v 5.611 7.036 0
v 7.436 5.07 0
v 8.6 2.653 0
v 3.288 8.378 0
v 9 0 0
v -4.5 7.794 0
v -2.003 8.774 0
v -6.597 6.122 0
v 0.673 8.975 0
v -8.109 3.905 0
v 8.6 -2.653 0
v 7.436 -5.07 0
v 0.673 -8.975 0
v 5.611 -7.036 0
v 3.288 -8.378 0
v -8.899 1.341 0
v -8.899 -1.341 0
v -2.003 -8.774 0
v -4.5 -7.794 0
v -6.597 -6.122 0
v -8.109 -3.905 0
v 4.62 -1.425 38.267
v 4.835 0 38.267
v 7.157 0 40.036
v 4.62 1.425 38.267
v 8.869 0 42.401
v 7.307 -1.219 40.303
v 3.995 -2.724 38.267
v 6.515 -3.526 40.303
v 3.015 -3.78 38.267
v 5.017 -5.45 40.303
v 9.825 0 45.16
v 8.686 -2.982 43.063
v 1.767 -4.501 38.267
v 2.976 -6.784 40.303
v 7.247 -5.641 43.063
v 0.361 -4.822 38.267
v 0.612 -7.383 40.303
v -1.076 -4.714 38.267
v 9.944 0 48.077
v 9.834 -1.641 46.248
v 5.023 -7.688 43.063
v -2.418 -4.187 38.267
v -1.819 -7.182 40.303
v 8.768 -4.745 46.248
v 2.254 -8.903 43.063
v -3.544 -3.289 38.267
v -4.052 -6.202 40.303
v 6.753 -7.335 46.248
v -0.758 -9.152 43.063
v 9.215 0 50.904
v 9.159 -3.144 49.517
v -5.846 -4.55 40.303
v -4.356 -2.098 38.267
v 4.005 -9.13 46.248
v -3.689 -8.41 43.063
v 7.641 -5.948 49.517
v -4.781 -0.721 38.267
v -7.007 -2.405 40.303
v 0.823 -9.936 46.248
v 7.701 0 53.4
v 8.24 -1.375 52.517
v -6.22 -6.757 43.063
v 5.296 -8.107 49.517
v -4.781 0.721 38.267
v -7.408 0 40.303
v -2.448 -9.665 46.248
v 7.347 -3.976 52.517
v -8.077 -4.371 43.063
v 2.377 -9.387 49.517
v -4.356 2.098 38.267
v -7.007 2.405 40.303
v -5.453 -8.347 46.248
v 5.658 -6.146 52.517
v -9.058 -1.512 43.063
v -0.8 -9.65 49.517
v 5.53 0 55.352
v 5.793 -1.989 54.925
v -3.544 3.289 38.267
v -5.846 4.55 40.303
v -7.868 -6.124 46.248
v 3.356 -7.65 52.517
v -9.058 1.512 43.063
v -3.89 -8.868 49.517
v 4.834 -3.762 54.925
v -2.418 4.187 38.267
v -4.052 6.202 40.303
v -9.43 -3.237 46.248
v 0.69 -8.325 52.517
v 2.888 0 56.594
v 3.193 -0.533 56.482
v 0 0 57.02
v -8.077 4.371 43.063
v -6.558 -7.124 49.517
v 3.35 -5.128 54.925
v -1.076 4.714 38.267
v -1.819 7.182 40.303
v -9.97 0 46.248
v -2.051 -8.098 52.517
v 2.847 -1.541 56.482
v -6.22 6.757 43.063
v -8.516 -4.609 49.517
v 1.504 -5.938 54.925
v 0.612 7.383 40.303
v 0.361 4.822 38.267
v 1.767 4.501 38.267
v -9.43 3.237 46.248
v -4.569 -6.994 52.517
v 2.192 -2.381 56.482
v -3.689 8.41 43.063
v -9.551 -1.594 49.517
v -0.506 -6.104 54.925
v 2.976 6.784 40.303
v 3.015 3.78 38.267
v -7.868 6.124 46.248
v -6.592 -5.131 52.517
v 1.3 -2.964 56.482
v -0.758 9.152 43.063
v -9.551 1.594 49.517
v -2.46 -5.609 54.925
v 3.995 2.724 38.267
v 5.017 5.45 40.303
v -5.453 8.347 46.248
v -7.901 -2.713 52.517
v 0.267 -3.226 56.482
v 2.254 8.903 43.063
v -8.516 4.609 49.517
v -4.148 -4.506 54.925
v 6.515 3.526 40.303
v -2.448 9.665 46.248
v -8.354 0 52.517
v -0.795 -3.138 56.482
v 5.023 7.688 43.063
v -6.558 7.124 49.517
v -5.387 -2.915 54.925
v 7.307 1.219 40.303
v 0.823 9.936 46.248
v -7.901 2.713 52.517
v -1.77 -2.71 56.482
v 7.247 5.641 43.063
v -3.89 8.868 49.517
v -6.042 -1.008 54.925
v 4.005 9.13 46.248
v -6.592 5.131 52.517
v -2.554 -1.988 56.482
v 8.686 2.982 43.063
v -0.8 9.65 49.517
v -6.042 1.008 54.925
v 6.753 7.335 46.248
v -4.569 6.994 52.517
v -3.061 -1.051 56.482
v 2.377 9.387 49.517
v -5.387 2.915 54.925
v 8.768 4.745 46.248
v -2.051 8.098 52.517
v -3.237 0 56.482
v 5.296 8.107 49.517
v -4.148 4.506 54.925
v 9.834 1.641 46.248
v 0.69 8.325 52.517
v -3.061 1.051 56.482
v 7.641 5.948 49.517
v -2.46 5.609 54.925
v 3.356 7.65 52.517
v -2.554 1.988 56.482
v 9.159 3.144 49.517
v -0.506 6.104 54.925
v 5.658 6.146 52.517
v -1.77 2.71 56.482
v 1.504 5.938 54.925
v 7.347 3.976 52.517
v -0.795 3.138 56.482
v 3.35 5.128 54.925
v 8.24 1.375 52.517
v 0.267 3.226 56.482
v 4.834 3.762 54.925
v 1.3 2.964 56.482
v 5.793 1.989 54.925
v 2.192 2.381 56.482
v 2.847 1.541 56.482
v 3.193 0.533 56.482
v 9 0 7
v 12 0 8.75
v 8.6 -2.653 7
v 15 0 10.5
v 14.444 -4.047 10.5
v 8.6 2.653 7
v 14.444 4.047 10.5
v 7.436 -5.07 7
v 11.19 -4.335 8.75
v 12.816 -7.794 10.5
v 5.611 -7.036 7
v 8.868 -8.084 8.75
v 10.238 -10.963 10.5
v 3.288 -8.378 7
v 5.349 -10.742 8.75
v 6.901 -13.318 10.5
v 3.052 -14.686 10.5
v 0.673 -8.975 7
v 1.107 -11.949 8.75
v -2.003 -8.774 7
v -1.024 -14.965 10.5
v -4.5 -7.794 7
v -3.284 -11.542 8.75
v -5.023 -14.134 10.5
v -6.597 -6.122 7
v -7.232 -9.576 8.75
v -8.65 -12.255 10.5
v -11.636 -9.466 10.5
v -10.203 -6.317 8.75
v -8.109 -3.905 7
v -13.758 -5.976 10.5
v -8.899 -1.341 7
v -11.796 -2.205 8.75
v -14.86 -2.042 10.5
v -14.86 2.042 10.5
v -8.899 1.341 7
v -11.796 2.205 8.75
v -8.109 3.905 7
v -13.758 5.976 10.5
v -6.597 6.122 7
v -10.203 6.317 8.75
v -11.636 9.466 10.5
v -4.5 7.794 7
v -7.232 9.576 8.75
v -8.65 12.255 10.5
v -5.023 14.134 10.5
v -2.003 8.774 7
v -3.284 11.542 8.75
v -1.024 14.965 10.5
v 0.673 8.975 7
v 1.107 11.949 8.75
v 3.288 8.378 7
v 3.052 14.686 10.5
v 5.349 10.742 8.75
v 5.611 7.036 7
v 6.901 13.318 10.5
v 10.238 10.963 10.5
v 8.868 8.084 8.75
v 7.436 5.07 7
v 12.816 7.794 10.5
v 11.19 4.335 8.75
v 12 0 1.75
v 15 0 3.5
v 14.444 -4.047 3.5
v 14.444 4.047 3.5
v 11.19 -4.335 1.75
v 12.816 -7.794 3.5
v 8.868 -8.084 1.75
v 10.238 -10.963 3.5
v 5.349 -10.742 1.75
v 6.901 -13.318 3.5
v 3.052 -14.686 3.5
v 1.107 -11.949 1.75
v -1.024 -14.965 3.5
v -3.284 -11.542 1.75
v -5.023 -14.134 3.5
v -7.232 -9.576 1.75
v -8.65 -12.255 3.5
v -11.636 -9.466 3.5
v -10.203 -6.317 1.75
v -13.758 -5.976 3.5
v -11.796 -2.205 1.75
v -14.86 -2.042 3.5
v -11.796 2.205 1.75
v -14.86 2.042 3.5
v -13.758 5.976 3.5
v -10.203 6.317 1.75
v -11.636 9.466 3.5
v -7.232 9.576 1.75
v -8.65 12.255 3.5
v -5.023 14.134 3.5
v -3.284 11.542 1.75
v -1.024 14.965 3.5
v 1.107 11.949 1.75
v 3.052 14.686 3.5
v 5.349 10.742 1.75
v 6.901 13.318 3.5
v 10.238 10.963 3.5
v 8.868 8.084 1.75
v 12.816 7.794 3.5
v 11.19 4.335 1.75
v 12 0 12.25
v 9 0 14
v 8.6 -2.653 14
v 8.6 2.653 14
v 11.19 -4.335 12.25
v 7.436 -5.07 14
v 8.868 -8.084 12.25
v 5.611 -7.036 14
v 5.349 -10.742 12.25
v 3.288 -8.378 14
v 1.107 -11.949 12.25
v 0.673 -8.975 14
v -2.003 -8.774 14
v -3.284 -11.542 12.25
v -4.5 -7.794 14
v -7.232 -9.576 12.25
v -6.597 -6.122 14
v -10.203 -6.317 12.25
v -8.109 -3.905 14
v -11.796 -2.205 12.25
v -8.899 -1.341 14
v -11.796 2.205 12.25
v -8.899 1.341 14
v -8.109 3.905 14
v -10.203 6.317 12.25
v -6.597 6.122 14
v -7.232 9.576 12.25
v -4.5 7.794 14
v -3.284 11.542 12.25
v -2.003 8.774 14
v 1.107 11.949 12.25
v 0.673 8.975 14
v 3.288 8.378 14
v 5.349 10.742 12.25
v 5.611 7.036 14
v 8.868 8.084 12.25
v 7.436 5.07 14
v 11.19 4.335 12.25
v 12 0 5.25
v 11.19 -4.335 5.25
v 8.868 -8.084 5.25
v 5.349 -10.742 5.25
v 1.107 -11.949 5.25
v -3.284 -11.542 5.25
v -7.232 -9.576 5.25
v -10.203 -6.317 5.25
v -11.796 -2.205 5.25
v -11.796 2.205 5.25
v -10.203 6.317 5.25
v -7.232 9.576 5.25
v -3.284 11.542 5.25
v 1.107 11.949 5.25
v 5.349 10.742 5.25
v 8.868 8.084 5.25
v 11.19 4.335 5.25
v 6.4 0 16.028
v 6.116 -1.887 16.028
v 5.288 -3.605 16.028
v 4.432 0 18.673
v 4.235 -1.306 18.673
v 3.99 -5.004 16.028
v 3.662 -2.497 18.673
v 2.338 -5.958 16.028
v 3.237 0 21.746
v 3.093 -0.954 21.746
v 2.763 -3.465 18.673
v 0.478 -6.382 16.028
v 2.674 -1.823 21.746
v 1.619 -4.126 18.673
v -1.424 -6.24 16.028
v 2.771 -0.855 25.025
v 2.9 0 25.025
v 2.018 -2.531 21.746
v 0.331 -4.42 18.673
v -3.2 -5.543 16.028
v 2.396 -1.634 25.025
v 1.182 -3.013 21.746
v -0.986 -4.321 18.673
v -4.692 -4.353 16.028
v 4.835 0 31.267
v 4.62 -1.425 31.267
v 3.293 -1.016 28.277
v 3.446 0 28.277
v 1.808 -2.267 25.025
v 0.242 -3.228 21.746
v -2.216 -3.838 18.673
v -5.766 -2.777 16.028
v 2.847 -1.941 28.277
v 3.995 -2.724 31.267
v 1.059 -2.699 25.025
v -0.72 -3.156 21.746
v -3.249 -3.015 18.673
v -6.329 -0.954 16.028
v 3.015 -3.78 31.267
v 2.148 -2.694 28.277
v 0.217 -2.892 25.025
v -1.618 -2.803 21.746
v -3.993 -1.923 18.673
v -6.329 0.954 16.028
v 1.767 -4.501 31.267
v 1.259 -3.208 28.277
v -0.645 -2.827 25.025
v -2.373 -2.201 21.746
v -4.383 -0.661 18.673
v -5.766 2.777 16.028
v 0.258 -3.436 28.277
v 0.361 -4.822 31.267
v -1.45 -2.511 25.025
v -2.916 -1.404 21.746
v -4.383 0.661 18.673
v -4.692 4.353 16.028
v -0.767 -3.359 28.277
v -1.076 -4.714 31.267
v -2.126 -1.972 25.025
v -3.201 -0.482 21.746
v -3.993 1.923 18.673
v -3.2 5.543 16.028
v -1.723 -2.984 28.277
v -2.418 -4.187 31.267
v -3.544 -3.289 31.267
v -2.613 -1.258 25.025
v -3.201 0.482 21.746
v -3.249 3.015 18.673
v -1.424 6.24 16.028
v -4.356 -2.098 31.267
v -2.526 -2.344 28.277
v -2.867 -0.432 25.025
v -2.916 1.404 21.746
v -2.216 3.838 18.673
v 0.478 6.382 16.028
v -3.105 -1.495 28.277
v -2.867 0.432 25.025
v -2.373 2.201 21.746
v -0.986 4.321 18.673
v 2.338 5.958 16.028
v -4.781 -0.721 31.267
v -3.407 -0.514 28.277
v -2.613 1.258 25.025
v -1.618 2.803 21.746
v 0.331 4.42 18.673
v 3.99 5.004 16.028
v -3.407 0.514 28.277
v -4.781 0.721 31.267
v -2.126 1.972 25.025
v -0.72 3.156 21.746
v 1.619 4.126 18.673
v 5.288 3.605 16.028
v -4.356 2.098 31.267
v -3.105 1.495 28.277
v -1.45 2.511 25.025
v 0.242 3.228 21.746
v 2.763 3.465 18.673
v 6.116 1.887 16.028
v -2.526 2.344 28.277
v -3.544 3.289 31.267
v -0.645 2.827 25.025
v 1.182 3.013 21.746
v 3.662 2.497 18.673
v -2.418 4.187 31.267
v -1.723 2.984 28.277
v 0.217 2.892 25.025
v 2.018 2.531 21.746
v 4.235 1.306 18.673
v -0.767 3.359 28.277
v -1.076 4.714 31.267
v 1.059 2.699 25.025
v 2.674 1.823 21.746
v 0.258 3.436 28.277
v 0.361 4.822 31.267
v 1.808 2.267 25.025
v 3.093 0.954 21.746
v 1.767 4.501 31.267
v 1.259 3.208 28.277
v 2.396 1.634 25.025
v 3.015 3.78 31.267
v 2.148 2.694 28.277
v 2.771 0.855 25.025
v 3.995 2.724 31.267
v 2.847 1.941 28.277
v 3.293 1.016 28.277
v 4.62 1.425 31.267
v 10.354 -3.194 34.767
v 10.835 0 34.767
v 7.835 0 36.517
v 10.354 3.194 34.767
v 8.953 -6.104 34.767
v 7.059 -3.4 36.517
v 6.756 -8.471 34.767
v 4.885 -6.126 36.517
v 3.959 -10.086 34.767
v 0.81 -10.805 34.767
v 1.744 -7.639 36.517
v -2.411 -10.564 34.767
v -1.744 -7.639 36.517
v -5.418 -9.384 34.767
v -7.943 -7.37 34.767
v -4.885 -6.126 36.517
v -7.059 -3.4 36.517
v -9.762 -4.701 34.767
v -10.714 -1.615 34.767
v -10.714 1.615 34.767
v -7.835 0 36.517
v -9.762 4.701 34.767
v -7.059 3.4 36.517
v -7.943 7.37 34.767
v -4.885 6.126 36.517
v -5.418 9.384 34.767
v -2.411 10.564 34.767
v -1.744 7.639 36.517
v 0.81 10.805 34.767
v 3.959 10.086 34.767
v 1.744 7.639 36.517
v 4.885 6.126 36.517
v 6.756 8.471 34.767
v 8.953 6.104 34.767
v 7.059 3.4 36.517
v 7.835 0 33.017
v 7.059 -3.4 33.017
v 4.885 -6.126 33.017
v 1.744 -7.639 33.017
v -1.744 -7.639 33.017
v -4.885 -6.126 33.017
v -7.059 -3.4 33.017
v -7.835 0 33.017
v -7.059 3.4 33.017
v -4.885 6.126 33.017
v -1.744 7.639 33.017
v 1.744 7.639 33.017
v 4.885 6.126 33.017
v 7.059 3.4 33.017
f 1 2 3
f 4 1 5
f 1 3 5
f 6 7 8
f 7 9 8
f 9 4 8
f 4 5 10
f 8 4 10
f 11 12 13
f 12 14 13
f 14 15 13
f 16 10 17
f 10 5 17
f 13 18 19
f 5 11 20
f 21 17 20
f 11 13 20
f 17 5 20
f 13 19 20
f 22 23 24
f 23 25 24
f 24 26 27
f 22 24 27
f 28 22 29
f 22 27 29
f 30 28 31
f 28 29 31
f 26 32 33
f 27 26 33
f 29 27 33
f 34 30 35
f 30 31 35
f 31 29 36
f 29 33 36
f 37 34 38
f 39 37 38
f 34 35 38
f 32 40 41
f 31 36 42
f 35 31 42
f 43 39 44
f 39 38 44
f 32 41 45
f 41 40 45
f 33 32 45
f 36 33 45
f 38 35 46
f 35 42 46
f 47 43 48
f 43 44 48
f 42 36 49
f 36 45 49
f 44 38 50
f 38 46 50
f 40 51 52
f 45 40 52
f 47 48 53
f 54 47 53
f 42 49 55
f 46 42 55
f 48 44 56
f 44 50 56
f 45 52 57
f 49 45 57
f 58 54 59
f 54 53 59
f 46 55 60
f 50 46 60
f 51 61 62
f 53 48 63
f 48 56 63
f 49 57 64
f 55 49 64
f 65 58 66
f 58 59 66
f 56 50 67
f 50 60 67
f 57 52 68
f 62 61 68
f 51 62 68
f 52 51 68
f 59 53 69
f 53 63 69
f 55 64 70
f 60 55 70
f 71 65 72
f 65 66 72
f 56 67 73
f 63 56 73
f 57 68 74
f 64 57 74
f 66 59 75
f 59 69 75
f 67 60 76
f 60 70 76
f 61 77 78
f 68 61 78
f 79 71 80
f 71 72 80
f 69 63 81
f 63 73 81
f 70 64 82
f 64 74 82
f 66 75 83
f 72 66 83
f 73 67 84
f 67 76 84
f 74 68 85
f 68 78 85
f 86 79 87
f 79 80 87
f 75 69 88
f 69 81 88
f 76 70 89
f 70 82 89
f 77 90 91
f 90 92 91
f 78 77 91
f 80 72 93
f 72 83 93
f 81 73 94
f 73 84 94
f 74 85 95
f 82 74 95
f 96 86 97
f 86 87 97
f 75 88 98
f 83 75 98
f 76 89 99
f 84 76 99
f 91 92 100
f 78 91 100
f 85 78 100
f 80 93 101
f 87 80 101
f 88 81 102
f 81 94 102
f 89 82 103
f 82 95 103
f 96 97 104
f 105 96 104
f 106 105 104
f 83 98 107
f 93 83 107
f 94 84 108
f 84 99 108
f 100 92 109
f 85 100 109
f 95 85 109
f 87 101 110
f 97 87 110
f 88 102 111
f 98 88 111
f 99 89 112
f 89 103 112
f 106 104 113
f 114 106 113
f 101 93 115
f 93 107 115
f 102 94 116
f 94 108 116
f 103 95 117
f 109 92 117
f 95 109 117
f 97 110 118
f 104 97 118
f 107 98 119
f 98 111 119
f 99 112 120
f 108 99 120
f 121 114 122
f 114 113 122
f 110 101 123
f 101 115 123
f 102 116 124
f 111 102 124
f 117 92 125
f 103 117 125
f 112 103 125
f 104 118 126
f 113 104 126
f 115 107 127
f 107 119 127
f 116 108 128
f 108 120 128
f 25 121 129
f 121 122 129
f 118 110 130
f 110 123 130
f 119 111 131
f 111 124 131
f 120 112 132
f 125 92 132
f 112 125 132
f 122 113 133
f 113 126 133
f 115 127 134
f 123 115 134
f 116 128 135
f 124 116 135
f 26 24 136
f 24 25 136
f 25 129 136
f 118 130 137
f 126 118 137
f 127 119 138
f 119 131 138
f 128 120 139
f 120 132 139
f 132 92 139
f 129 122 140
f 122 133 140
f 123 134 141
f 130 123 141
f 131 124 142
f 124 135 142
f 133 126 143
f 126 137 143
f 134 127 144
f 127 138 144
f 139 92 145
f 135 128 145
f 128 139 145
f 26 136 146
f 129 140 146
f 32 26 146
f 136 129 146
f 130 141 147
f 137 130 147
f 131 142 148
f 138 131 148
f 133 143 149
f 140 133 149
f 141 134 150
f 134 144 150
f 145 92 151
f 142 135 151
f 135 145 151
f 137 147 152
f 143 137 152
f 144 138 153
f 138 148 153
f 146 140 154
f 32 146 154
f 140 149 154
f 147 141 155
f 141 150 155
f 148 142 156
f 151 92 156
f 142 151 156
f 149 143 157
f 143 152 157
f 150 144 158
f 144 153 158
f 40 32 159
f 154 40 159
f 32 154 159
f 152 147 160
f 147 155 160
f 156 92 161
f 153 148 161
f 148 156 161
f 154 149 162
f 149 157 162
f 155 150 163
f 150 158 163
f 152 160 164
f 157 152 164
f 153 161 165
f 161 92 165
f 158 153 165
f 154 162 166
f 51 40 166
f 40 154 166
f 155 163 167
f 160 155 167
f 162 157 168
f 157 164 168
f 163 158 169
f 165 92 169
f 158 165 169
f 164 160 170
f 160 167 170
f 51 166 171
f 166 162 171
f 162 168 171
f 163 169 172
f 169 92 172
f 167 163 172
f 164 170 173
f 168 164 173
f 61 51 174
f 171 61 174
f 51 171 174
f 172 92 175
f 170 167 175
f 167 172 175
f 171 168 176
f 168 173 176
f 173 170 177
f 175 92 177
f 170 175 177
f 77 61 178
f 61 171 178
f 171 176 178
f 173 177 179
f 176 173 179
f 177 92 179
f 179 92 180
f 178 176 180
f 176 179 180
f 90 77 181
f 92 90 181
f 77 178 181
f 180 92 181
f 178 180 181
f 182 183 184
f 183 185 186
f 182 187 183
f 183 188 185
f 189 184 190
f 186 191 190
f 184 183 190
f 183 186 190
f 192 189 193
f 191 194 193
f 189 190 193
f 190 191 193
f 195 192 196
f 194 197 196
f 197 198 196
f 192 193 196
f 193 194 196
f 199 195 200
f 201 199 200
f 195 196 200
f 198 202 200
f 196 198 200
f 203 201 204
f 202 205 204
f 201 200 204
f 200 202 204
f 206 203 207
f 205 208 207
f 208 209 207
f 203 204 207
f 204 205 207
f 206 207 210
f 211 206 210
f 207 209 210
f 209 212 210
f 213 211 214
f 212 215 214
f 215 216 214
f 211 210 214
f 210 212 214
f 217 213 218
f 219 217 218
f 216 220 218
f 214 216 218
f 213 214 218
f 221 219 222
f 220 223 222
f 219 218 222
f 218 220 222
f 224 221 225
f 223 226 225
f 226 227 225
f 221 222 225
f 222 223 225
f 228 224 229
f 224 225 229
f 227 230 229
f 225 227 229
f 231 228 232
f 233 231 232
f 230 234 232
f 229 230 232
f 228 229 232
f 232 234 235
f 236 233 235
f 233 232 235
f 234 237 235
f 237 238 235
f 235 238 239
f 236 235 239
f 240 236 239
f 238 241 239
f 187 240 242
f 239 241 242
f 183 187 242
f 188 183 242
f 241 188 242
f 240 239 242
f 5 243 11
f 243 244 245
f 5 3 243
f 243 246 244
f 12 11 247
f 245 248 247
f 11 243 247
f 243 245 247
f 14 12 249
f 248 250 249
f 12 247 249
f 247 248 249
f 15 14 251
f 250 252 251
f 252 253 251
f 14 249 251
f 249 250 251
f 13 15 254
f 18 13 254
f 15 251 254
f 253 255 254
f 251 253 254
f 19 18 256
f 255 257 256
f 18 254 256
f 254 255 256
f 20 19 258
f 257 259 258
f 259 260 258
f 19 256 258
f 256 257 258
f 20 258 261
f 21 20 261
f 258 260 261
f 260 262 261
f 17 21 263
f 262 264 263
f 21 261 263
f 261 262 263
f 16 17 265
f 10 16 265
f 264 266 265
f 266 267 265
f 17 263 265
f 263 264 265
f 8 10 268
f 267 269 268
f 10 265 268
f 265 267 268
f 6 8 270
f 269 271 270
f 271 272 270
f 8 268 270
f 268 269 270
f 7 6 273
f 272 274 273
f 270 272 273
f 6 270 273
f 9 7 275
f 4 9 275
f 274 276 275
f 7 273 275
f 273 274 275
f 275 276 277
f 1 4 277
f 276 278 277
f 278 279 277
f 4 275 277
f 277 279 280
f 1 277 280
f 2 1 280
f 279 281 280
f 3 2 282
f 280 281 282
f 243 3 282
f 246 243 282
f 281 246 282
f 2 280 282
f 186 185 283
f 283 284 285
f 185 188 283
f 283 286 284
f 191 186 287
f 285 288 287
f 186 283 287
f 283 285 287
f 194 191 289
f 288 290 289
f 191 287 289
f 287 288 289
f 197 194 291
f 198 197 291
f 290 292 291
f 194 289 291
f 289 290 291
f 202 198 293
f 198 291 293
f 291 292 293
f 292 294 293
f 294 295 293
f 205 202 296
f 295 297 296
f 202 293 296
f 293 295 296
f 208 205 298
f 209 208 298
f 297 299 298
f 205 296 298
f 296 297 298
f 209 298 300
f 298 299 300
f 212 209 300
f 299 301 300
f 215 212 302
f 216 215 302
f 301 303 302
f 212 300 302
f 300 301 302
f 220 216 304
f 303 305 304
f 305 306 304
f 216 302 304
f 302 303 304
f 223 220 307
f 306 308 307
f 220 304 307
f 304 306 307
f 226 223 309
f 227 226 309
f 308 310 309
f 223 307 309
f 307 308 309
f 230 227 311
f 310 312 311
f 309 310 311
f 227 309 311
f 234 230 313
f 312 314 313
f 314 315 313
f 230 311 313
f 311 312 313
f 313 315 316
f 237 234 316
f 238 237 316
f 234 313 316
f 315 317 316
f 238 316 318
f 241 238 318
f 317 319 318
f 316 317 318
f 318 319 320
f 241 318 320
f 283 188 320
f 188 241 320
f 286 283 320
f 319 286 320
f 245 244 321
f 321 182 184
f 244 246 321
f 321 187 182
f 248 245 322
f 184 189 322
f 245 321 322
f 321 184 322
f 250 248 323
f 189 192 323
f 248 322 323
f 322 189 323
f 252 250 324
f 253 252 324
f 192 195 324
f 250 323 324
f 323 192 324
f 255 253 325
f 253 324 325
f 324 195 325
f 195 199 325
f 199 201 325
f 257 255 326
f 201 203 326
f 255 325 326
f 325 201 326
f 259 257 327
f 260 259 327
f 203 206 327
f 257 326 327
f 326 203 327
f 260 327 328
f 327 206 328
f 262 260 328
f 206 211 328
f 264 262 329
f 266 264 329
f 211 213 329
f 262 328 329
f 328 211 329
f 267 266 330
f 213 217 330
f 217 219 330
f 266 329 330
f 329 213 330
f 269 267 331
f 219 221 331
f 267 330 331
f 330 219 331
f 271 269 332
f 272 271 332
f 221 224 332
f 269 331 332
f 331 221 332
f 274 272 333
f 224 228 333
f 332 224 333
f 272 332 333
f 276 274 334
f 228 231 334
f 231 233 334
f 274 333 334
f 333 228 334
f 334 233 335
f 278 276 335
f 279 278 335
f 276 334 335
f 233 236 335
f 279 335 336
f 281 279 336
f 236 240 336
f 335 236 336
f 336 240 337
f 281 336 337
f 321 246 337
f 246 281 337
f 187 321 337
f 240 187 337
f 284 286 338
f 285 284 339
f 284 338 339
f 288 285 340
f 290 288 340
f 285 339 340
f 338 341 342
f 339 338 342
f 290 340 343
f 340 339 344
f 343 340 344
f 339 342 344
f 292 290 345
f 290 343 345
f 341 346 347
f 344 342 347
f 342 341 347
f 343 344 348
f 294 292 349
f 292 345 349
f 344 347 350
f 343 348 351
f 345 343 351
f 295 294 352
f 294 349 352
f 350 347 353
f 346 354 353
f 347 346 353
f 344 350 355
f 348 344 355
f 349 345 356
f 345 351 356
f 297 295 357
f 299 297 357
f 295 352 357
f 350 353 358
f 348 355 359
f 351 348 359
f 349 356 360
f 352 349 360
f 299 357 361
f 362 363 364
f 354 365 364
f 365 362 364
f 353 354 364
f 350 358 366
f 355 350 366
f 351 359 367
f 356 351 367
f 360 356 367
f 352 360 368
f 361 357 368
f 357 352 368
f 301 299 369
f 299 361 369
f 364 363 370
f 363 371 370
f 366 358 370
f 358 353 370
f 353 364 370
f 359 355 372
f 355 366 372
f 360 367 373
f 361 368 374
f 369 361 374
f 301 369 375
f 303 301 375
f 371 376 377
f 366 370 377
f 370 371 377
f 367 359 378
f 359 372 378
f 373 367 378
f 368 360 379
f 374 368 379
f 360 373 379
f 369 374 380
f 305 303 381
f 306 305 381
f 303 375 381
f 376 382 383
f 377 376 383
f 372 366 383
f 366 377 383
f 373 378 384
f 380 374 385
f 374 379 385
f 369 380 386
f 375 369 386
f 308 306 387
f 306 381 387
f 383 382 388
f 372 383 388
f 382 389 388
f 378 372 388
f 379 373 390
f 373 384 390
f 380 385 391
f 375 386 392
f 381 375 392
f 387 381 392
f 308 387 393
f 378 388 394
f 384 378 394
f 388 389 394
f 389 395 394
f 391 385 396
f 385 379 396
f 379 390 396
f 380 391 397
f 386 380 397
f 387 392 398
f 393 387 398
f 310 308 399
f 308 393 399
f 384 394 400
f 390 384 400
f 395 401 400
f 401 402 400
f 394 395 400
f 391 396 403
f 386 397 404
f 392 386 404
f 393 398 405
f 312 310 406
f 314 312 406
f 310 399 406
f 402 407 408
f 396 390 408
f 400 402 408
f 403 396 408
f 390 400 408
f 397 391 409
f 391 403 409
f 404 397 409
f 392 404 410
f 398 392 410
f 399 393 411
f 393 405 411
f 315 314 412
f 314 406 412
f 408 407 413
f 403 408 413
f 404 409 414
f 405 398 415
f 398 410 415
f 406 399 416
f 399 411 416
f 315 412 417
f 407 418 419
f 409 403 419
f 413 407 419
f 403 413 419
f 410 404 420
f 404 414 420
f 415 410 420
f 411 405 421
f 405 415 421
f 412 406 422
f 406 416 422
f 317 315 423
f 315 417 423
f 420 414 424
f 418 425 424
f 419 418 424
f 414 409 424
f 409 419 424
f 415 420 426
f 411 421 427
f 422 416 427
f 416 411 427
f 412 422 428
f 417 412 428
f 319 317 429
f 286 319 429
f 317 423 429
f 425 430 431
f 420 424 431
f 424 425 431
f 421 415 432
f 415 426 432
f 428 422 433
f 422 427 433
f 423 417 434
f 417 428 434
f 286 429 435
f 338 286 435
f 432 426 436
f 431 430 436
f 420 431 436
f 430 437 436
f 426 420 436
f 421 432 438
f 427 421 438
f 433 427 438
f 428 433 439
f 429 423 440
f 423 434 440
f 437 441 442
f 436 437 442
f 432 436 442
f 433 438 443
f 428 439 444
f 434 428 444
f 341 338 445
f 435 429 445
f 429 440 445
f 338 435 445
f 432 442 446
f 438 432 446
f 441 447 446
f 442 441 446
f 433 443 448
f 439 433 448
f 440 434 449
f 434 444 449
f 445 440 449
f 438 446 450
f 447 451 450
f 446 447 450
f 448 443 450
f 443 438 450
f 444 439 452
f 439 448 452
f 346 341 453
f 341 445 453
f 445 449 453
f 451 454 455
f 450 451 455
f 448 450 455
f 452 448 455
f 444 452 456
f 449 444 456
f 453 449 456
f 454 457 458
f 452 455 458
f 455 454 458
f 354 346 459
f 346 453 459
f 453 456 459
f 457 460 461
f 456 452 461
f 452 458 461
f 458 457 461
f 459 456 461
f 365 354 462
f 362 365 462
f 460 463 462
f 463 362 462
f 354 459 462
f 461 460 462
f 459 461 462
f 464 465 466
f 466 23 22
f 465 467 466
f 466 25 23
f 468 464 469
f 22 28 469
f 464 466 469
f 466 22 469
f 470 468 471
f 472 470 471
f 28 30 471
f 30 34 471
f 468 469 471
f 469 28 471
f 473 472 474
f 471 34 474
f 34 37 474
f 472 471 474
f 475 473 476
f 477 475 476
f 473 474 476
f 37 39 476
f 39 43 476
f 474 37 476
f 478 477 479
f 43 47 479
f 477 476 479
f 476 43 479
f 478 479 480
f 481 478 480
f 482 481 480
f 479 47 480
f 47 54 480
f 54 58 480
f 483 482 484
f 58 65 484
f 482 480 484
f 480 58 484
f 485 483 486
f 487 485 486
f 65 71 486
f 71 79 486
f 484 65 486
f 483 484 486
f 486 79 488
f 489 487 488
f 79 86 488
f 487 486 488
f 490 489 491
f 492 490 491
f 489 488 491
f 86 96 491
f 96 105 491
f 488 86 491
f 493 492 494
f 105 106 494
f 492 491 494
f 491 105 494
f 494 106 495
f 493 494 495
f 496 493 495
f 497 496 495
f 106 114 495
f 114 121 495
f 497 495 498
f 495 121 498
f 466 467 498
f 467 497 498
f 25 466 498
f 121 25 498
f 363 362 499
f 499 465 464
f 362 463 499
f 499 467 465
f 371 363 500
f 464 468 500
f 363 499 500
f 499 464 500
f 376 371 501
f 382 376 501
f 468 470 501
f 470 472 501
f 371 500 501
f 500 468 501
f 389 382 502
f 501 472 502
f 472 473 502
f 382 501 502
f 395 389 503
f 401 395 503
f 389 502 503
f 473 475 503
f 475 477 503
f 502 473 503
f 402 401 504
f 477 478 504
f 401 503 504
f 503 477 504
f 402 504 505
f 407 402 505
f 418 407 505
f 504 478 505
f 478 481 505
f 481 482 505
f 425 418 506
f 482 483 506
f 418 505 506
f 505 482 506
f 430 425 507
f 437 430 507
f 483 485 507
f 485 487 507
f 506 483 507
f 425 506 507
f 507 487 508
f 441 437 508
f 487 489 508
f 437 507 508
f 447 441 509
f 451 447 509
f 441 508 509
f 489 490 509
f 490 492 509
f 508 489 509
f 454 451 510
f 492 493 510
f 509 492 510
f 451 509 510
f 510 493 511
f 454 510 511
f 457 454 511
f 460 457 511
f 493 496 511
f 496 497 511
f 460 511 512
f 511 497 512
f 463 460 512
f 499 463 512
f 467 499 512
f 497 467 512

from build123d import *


with BuildPart() as f1:
    # F0 (on Front) → F1 (revolve)
    with BuildSketch(Plane.XZ):
        with BuildLine():
            Line((0, 57.020247), (0, 0))
            Line((0, 0), (9, 0))
            Line((9, 0), (15, 3.5))
            Line((15, 3.5), (9, 7))
            Line((9, 7), (15, 10.5))
            Line((15, 10.5), (9, 14))
            ThreePointArc((9, 14), (3.236656, 21.745631), (4.835254, 31.266944))
            Line((4.835254, 31.266944), (10.835254, 34.766944))
            Line((10.835254, 34.766944), (4.835254, 38.266944))
            ThreePointArc((4.835254, 38.266944), (9.683311, 49.516942), (0, 57.020247))
        make_face()
    revolve(axis=Axis((0, 0, 28.510124), (0, 0, -1)))


solid = f1.part
